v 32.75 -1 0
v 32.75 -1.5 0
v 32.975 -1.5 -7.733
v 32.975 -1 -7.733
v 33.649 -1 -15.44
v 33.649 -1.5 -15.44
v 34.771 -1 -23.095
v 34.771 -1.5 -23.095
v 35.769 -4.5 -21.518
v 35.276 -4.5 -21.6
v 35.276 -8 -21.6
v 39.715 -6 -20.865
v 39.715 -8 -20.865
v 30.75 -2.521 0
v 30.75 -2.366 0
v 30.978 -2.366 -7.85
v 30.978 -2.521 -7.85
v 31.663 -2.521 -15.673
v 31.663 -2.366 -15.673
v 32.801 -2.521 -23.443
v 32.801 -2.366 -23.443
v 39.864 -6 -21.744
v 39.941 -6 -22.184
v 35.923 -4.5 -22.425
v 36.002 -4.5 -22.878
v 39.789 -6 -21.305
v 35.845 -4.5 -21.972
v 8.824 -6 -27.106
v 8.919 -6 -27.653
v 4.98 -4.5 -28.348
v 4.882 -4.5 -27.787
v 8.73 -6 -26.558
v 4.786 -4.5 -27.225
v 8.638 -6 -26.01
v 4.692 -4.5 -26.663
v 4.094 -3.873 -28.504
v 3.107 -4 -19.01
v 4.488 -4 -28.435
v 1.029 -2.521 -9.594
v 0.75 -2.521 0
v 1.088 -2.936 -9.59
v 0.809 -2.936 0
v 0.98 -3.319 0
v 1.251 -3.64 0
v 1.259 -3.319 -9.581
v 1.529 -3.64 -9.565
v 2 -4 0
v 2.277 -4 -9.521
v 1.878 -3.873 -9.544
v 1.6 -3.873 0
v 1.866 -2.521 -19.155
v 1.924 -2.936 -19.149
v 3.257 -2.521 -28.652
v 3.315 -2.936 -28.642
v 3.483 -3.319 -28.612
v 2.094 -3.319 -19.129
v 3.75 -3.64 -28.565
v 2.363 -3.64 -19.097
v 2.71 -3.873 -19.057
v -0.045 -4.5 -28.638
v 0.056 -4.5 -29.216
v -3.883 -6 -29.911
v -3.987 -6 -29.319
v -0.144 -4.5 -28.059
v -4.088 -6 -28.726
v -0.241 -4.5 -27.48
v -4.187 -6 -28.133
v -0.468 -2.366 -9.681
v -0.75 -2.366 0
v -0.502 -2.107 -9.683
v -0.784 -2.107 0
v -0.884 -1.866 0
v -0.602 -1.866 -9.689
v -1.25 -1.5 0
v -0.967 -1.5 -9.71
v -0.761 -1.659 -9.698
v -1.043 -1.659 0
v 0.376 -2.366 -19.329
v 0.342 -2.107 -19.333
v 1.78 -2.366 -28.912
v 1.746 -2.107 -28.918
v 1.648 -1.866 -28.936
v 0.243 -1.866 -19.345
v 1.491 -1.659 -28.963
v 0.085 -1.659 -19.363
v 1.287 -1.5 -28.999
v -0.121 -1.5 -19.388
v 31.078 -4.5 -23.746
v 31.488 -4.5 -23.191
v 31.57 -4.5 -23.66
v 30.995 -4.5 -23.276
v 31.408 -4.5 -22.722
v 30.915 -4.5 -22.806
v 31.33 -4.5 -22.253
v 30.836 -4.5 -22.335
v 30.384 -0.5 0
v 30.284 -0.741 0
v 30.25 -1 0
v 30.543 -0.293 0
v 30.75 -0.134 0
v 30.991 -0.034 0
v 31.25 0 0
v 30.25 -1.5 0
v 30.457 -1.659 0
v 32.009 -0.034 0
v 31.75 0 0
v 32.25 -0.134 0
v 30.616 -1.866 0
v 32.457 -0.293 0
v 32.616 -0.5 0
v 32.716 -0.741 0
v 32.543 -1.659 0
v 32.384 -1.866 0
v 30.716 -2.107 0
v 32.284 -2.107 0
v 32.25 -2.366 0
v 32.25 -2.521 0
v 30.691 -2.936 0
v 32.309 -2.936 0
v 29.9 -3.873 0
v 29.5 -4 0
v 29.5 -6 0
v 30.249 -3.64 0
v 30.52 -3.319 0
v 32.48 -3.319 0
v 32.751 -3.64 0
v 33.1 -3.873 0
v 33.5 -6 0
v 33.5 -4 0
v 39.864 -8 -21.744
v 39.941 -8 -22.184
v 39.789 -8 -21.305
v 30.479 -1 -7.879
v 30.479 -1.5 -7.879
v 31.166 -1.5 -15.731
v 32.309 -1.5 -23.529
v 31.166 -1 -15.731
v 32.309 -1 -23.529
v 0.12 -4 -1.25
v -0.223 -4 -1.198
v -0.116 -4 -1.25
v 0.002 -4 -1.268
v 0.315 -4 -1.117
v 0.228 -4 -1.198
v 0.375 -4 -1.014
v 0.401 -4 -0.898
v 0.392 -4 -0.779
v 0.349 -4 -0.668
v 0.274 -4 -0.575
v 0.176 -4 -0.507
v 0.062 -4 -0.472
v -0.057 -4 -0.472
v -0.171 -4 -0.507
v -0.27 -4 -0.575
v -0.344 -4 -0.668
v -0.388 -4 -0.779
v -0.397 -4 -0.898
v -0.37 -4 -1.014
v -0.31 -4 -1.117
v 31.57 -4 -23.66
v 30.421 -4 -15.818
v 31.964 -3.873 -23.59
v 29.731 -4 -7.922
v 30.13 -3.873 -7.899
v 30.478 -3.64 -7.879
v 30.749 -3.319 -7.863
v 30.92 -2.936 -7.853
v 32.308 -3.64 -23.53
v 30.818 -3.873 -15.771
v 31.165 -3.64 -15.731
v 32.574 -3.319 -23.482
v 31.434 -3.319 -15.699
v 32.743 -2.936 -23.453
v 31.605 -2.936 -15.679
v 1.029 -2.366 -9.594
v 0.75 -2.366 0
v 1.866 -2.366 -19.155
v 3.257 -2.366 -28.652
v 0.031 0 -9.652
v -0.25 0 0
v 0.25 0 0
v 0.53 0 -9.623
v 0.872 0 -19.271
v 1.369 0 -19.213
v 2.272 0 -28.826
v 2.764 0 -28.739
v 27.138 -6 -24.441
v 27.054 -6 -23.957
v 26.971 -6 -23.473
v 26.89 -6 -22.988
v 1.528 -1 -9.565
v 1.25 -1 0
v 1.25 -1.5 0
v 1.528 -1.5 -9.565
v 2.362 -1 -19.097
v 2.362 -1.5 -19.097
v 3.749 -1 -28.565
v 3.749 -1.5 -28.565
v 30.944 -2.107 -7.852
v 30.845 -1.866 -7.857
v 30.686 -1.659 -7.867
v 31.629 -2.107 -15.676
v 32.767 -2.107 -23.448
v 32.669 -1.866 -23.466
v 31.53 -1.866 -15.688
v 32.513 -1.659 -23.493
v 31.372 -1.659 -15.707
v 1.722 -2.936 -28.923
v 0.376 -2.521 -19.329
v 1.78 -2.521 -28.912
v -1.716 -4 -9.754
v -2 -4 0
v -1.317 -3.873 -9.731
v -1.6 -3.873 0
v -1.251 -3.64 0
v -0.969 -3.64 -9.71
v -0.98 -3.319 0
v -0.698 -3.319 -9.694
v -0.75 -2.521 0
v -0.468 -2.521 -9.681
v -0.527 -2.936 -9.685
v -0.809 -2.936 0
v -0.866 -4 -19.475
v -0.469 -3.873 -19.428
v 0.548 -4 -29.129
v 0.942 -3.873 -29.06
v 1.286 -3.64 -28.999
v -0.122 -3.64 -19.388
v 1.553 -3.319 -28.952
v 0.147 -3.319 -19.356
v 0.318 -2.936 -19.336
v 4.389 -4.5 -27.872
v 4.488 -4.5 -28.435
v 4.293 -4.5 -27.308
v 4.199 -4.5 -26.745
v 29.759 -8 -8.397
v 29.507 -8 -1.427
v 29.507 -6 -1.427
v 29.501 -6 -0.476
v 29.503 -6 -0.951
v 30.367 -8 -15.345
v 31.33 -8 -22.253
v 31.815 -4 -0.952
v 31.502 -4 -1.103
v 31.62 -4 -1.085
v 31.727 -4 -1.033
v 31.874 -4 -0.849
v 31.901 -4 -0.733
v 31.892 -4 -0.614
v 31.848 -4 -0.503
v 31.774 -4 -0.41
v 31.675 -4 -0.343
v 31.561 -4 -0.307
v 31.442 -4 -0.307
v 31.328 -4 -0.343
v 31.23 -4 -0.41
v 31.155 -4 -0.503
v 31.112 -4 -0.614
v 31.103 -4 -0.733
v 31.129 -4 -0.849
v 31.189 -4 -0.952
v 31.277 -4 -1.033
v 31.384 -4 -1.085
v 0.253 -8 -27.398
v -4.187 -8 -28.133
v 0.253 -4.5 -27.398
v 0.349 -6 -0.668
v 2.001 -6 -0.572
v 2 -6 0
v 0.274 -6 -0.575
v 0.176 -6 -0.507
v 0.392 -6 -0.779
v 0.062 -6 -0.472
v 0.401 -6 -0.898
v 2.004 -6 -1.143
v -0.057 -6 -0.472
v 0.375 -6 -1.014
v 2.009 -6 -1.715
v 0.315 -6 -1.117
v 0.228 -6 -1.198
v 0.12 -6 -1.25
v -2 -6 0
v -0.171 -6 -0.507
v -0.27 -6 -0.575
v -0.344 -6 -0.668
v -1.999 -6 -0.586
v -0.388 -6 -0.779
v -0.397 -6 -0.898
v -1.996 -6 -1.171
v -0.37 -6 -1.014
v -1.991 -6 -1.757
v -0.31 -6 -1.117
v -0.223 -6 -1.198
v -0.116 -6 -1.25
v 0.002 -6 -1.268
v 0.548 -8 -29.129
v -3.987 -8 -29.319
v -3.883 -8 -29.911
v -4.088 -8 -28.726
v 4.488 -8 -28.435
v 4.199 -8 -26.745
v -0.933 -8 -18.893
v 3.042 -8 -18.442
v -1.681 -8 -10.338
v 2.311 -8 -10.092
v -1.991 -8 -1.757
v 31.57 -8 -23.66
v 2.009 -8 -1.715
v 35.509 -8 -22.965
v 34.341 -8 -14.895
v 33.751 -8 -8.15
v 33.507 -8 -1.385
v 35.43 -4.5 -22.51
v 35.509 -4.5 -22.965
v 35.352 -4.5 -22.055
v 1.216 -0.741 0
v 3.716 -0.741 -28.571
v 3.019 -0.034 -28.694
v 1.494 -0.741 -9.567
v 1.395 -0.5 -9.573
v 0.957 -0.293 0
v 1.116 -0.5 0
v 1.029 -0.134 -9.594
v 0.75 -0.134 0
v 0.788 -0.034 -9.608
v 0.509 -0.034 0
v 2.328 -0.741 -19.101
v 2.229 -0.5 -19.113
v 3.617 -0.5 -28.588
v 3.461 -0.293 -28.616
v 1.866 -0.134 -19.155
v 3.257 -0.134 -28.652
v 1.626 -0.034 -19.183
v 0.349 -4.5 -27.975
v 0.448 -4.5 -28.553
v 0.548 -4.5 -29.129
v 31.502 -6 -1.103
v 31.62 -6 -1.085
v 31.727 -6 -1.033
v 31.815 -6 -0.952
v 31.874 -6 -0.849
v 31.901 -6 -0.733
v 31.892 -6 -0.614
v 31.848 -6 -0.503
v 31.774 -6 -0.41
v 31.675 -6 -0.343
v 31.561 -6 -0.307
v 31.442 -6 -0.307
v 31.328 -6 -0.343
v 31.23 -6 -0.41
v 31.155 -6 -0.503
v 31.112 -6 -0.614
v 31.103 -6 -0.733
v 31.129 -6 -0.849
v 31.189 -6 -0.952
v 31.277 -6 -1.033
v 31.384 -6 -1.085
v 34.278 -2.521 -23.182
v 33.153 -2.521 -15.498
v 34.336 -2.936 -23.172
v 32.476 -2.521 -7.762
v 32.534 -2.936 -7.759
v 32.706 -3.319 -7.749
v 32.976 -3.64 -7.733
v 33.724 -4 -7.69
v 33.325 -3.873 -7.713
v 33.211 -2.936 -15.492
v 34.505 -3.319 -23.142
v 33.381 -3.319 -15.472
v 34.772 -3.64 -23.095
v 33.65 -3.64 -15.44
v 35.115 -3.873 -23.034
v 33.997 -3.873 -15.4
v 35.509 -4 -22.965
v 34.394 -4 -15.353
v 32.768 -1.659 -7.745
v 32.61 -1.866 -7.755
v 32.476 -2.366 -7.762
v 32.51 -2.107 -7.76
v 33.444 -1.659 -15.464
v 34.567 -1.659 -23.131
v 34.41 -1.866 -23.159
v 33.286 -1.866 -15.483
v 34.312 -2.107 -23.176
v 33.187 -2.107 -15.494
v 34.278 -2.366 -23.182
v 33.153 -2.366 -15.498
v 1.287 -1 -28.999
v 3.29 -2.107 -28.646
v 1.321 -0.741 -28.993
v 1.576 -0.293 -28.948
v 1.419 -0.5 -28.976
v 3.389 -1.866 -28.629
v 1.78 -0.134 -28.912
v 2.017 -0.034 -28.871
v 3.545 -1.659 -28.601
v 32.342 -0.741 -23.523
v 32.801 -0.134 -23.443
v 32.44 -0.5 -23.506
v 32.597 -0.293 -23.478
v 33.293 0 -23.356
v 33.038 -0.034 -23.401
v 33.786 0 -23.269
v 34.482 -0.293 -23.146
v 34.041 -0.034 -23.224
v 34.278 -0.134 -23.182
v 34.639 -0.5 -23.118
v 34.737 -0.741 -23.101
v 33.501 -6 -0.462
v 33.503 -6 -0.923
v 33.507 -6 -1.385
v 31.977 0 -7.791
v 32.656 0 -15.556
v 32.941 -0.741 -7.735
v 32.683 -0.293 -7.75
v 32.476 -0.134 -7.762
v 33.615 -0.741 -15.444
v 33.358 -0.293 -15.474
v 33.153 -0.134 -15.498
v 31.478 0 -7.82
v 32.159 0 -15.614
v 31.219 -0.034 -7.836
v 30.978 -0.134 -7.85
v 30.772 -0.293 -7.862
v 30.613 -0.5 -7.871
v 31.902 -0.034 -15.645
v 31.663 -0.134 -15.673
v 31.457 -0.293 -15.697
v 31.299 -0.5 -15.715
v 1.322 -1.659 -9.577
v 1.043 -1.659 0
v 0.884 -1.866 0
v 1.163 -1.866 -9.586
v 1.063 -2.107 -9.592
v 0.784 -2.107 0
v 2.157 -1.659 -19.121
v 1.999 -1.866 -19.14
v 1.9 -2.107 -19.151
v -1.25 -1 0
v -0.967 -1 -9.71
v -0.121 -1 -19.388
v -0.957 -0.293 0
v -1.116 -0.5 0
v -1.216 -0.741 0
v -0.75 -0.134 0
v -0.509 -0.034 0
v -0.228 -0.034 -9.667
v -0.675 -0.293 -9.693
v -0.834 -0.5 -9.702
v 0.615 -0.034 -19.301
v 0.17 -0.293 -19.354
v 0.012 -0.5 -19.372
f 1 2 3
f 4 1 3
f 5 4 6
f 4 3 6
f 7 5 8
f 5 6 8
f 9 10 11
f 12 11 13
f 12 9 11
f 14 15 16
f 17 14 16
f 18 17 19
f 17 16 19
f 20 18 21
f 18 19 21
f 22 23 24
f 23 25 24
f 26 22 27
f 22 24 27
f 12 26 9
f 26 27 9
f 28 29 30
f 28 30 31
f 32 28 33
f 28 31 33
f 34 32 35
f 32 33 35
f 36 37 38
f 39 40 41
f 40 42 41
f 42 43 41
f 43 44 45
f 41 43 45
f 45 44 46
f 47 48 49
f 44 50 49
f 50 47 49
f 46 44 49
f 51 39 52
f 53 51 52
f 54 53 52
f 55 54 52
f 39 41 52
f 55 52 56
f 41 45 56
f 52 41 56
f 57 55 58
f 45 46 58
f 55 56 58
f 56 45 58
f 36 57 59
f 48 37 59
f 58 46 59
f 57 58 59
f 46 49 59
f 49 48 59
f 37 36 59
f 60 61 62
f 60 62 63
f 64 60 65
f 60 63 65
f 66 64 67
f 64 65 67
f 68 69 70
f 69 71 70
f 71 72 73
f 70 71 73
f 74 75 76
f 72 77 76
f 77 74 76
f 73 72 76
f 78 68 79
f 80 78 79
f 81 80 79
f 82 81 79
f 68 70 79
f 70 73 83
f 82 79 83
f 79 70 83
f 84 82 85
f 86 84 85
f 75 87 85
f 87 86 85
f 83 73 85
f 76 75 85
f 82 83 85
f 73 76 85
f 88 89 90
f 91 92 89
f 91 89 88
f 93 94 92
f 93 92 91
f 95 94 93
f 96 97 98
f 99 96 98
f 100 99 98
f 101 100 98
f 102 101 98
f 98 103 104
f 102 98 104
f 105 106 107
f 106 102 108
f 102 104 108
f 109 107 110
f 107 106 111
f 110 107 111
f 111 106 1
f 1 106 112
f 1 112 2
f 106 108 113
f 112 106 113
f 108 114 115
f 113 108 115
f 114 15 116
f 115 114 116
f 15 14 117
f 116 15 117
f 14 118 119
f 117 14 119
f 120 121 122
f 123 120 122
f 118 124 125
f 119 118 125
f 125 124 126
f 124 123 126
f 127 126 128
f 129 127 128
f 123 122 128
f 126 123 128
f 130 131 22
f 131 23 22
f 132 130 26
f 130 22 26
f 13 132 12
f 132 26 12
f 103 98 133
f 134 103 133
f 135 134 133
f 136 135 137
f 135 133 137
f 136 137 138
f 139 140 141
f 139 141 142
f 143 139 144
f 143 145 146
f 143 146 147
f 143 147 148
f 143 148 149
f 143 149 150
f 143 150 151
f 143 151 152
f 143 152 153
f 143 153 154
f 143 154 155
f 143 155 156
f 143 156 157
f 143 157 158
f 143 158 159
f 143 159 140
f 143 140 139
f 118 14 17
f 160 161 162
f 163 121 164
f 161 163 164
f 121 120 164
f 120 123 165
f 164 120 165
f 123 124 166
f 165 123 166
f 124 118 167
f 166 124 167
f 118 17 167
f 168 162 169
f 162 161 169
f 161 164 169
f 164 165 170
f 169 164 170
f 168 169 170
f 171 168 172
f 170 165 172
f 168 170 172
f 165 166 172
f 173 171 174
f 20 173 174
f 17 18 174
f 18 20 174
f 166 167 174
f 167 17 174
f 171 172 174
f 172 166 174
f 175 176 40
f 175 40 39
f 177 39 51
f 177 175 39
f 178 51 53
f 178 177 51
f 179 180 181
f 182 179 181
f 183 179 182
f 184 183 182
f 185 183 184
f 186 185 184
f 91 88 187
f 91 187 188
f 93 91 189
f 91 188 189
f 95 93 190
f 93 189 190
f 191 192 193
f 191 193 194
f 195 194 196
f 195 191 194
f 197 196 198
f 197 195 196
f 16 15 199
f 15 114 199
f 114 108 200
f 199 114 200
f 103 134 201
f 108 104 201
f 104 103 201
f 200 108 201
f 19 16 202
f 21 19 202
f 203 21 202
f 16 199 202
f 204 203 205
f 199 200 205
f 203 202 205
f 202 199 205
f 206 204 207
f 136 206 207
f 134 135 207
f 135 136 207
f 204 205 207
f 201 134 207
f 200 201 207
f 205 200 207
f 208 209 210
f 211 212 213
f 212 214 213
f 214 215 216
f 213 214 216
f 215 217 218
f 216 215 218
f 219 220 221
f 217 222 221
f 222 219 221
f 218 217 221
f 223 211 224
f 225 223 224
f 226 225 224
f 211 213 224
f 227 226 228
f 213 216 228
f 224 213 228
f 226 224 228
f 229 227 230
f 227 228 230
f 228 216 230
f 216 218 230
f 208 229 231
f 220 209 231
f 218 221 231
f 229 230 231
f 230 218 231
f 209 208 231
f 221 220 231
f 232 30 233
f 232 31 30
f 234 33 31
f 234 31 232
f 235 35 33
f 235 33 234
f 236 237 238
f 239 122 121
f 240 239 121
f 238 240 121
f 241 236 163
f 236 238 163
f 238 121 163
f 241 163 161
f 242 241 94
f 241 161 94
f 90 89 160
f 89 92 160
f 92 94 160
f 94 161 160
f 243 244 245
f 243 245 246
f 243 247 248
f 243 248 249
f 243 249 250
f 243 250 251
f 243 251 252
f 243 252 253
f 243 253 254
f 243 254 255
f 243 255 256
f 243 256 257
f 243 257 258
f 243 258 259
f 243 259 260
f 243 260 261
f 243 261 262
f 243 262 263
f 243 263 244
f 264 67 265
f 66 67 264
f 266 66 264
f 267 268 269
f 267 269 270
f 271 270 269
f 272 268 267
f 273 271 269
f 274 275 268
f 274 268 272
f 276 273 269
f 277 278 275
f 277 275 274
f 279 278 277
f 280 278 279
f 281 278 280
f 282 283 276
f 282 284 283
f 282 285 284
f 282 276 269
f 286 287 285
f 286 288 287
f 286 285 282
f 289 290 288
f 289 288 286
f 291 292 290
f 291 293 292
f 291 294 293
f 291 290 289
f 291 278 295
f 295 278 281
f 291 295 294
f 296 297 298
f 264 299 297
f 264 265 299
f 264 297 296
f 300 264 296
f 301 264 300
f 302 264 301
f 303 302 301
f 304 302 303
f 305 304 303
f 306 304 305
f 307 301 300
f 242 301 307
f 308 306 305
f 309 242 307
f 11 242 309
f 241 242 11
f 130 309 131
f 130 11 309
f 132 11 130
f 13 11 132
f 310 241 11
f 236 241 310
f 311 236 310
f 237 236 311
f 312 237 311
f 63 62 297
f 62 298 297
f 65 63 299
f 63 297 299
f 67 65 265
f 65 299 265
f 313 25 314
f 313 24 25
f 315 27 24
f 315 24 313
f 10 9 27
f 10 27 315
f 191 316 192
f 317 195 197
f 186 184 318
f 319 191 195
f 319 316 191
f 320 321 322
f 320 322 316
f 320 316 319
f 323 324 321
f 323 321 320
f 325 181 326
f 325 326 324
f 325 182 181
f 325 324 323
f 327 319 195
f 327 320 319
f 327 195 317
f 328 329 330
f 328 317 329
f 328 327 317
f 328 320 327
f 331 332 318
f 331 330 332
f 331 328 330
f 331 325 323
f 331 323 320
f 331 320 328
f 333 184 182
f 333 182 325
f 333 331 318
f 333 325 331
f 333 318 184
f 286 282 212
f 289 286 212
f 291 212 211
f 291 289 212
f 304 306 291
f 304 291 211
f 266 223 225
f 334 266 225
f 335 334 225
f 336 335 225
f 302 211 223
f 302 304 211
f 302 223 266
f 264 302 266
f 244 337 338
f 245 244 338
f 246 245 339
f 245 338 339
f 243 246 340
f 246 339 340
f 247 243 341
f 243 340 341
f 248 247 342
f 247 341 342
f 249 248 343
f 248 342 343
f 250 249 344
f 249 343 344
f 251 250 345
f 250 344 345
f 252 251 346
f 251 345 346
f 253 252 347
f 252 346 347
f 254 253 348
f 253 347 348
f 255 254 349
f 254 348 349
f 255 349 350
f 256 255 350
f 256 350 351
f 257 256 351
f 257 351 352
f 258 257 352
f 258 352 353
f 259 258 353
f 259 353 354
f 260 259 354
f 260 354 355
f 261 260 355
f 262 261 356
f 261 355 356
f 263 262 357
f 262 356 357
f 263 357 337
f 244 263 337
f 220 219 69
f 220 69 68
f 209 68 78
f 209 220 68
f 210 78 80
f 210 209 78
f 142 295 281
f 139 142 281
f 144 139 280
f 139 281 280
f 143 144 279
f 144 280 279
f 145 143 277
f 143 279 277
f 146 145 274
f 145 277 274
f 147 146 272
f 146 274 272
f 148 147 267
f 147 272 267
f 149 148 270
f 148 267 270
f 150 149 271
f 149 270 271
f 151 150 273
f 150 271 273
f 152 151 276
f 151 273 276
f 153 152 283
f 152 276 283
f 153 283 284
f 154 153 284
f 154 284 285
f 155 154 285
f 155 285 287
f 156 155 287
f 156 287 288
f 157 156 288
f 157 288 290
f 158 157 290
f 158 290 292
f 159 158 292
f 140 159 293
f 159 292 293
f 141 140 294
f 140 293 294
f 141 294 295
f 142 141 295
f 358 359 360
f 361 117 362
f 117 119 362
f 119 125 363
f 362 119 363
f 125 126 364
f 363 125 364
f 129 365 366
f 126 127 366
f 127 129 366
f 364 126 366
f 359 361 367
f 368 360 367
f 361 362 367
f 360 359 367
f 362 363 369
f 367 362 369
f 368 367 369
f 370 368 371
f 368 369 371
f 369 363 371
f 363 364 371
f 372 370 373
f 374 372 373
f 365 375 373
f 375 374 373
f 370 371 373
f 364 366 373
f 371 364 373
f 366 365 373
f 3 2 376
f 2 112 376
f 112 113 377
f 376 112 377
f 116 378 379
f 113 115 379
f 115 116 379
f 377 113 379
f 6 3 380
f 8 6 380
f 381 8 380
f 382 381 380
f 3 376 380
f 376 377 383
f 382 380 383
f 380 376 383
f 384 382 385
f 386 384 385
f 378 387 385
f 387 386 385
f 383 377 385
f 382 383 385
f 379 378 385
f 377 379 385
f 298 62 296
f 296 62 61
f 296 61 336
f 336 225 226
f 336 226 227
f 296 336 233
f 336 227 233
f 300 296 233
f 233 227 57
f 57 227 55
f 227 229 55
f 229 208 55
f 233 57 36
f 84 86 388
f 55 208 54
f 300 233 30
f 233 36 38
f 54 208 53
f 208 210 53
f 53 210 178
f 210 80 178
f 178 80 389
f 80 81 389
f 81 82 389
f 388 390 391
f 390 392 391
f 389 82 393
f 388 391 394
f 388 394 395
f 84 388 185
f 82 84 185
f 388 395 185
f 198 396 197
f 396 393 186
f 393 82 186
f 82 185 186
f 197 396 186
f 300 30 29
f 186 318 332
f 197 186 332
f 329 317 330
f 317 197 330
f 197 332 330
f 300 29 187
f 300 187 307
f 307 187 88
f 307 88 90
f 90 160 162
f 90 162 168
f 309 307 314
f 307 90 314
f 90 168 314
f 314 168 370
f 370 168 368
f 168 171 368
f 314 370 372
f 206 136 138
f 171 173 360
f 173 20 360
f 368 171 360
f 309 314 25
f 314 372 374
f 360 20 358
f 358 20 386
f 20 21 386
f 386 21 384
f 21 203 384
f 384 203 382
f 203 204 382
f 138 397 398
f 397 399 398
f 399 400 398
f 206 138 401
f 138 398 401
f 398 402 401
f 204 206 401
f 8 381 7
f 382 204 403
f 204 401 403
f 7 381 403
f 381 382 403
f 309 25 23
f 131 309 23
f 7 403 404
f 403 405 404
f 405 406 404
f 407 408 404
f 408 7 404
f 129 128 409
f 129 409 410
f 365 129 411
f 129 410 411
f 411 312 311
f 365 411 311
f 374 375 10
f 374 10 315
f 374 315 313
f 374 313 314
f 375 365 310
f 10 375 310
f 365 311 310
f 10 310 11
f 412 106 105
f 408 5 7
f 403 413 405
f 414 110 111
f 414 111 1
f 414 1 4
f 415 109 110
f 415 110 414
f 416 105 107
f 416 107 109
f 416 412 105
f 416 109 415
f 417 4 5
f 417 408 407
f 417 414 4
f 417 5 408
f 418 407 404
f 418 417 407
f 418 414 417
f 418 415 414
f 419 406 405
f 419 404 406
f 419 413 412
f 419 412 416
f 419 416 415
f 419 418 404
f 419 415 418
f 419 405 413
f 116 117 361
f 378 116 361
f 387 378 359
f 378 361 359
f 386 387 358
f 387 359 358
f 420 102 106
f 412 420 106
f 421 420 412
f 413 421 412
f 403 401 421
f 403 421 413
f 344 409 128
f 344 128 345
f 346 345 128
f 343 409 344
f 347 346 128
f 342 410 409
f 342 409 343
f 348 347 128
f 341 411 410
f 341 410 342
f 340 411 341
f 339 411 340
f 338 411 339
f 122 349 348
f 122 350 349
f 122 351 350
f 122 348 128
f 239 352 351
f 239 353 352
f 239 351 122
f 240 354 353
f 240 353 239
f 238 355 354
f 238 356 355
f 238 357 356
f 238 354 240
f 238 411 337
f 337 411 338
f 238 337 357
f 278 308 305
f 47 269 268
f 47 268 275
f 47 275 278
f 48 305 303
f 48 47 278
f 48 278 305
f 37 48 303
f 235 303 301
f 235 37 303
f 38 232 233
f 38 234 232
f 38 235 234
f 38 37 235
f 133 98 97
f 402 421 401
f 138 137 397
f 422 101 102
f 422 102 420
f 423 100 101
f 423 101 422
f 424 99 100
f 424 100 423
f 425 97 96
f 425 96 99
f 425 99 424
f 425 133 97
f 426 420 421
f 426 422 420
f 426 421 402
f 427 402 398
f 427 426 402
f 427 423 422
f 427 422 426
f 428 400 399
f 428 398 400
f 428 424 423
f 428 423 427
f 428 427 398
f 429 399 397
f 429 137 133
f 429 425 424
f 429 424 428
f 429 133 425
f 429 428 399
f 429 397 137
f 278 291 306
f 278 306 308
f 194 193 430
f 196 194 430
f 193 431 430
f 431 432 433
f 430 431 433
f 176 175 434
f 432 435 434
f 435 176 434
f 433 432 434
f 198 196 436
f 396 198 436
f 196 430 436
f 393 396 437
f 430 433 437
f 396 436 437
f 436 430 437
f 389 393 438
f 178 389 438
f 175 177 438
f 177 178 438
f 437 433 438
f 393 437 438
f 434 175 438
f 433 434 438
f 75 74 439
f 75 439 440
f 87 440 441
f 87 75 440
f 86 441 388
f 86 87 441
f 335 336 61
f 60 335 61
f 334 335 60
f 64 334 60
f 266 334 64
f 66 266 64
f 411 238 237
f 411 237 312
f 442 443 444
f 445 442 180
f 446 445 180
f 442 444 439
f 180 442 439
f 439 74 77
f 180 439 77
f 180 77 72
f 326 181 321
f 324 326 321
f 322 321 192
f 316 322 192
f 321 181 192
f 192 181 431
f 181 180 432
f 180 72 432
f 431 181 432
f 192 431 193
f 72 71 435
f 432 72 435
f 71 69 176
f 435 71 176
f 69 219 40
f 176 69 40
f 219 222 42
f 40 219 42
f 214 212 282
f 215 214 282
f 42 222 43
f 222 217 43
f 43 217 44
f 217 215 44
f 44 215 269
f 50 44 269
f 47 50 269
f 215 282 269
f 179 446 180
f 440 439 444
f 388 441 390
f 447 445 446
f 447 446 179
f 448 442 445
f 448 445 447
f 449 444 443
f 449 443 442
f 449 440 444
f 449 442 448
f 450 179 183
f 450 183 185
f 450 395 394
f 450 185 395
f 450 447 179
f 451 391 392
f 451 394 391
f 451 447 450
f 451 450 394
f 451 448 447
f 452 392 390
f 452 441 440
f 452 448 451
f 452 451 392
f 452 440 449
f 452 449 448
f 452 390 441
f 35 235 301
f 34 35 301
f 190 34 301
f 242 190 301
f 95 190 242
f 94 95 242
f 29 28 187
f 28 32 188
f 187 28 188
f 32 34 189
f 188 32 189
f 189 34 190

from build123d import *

# Parameters (mm, degrees)
REVOLVE_1_ANGLE     = 10
FILLET_1_R          = 1.5
FILLET_2_R          = 1.5
FILLET_3_R          = 1
FILLET_4_R          = 1
SKETCH_7_W          = 4
SKETCH_7_H          = 2
CUT_REVOLVE_1_ANGLE = 0.6
SKETCH_10_R         = 0.4
CUT_EXTRUDE_1_DEPTH = 2
REVOLVE_2_ANGLE     = 0.6


with BuildPart() as part:
    # 草图4 → 旋转1 (revolve)
    with BuildSketch(Plane.XY):
        Polygon((0.75, -1.5), (1.25, -1.5), (1.25, 0), (0, 0), (-1.25, 0), (-1.25, -1.5), (-0.75, -1.5), (-0.75, -4), (-2, -4), (-2, -8), (0, -8), (2, -8), (2, -4), (0.75, -4), align=None)
        Polygon((31.5, 0), (32.75, 0), (32.75, -1.5), (32.25, -1.5), (32.25, -4), (33.5, -4), (33.5, -8), (31.5, -8), (29.5, -8), (29.5, -4), (30.75, -4), (30.75, -1.5), (30.25, -1.5), (30.25, 0), align=None)
    revolve(axis=Axis((165.75, 3.853460973, 0), (0, -1, 0)), revolution_arc=REVOLVE_1_ANGLE)

    # 圆角1
    # the kernel refuses this fillet: 1.5 mm, written as the material it adds along each edge
    with BuildSketch(Plane(origin=(165.75, -4, 0), x_dir=(-1, 0, 0), z_dir=(0, 0, 1))) as fillet_1_piece_1:
        with BuildLine():
            CenterArc((163.5, -1.479019946), FILLET_1_R, 0, 80.405931773)
            Line((165, -1.479019946), (165.03, -1.479019946))
            Line((165.03, -1.479019946), (165.03, 0))
            Line((165.03, 0), (165, 0.03))
            ThreePointArc((165, 0.03), (164.375, 0.03), (163.755, 0.029580399))
            Line((163.755, 0.029580399), (163.75, 0))
        make_face()
    revolve(axis=Axis((165.75, -4, 0), (0, -1, 0)), revolution_arc=10)
    with BuildSketch(Plane(origin=(165.75, -4, 0), x_dir=(-1, 0, 0), z_dir=(0, 0, 1))) as fillet_1_piece_2:
        with BuildLine():
            CenterArc((168, -1.479019946), FILLET_1_R, 99.594068227, 80.405931773)
            Line((166.5, -1.479019946), (166.47, -1.479019946))
            Line((166.47, -1.479019946), (166.47, 0))
            Line((166.47, 0), (166.5, 0.03))
            ThreePointArc((166.5, 0.03), (167.125, 0.03), (167.745, 0.029580399))
            Line((167.745, 0.029580399), (167.75, 0))
        make_face()
    revolve(axis=Axis((165.75, -4, 0), (0, -1, 0)), revolution_arc=10)

    # 圆角2
    # the kernel refuses this fillet: 1.5 mm, written as the material it adds along each edge
    with BuildSketch(Plane(origin=(165.75, -4, 0), x_dir=(-1, 0, 0), z_dir=(0, 0, 1))) as fillet_2_piece_1:
        with BuildLine():
            CenterArc((136.5, -1.479019946), FILLET_2_R, 99.594068227, 80.405931773)
            Line((136.25, 0), (136.245, 0.029580399))
            ThreePointArc((136.245, 0.029580399), (135.625, 0.03), (135, 0.03))
            Line((135, 0.03), (134.97, 0))
            Line((134.97, 0), (134.97, -1.479019946))
            Line((134.97, -1.479019946), (135, -1.479019946))
        make_face()
    revolve(axis=Axis((165.75, -4, 0), (0, -1, 0)), revolution_arc=10)
    with BuildSketch(Plane(origin=(165.75, -4, 0), x_dir=(-1, 0, 0), z_dir=(0, 0, 1))) as fillet_2_piece_2:
        with BuildLine():
            CenterArc((132, -1.479019946), FILLET_2_R, 0, 80.405931773)
            Line((133.5, -1.479019946), (133.53, -1.479019946))
            Line((133.53, -1.479019946), (133.53, 0))
            Line((133.53, 0), (133.5, 0.03))
            ThreePointArc((133.5, 0.03), (132.875, 0.03), (132.255, 0.029580399))
            Line((132.255, 0.029580399), (132.25, 0))
        make_face()
    revolve(axis=Axis((165.75, -4, 0), (0, -1, 0)), revolution_arc=10)

    # 圆角3
    # the kernel refuses this fillet: 1 mm, written as the material it adds along each edge
    with BuildSketch(Plane(origin=(165.75, -1.5, 0), x_dir=(-1, 0, 0), z_dir=(0, 0, 1))) as fillet_3_piece_1:
        with BuildLine():
            CenterArc((136, 0.866025404), FILLET_3_R, 180, 60)
            Line((135, 0.866025404), (135, 0))
            Line((135, 0), (135.5, 0))
        make_face()
    revolve(axis=Axis((165.75, -1.5, 0), (0, -1, 0)), revolution_arc=10)
    with BuildSketch(Plane(origin=(165.75, -1.5, 0), x_dir=(-1, 0, 0), z_dir=(0, 0, 1))) as fillet_3_piece_2:
        with BuildLine():
            CenterArc((132.5, 0.866025404), FILLET_3_R, 300, 60)
            Line((133, 0), (133.5, 0))
            Line((133.5, 0), (133.5, 0.866025404))
        make_face()
    revolve(axis=Axis((165.75, -1.5, 0), (0, -1, 0)), revolution_arc=10)
    # the kernel refuses this fillet: 1 mm, written as the material it takes off along each edge
    with BuildSketch(Plane(origin=(165.75, 0, 0), x_dir=(-0.9998233399867428, 0, 0.018795978765534377), z_dir=(0.018795978765534377, 0, 0.9998233399867428))) as fillet_3_2_piece_1:
        with BuildLine():
            CenterArc((133 + FILLET_3_R, FILLET_3_R), FILLET_3_R, 180, 90)
            Line((133, FILLET_3_R), (133, 0))
            Line((133, 0), (133 + FILLET_3_R, 0))
        make_face()
    revolve(axis=Axis((165.75, 0, 0), (0, -1, 0)), revolution_arc=12.153987353, mode=Mode.SUBTRACT)
    with BuildSketch(Plane(origin=(165.75, 0, 0), x_dir=(-0.9998297984864879, 0, 0.01844922921070363), z_dir=(0.01844922921070363, 0, 0.9998297984864879))) as fillet_3_2_piece_2:
        with BuildLine():
            CenterArc((135.5 - FILLET_3_R, FILLET_3_R), FILLET_3_R, 270, 90)
            Line((135.5 - FILLET_3_R, 0), (135.5, 0))
            Line((135.5, 0), (135.5, FILLET_3_R))
        make_face()
    revolve(axis=Axis((165.75, 0, 0), (0, -1, 0)), revolution_arc=12.114245889, mode=Mode.SUBTRACT)

    # 圆角4
    # the kernel refuses this fillet: 1 mm, written as the material it adds along each edge
    with BuildSketch(Plane(origin=(165.75, -1.5, 0), x_dir=(-1, 0, 0), z_dir=(0, 0, 1))) as fillet_4_piece_1:
        with BuildLine():
            CenterArc((167.5, 0.866025404), FILLET_4_R, 180, 60)
            Line((167, 0), (166.5, 0))
            Line((166.5, 0), (166.5, 0.866025404))
        make_face()
    revolve(axis=Axis((165.75, -1.5, 0), (0, -1, 0)), revolution_arc=10)
    with BuildSketch(Plane(origin=(165.75, -1.5, 0), x_dir=(-1, 0, 0), z_dir=(0, 0, 1))) as fillet_4_piece_2:
        with BuildLine():
            CenterArc((164, 0.866025404), FILLET_4_R, 300, 60)
            Line((164.5, 0), (165, 0))
            Line((165, 0), (165, 0.866025404))
        make_face()
    revolve(axis=Axis((165.75, -1.5, 0), (0, -1, 0)), revolution_arc=10)
    # the kernel refuses this fillet: 1 mm, written as the material it takes off along each edge
    with BuildSketch(Plane(origin=(165.75, 0, 0), x_dir=(-0.9998845180351503, 0, 0.015197058715919934), z_dir=(0.015197058715919934, 0, 0.9998845180351503))) as fillet_4_2_piece_1:
        with BuildLine():
            CenterArc((164.5 + FILLET_4_R, FILLET_4_R), FILLET_4_R, 180, 90)
            Line((164.5, FILLET_4_R), (164.5, 0))
            Line((164.5, 0), (164.5 + FILLET_4_R, 0))
        make_face()
    revolve(axis=Axis((165.75, 0, 0), (0, -1, 0)), revolution_arc=11.74152169, mode=Mode.SUBTRACT)
    with BuildSketch(Plane(origin=(165.75, 0, 0), x_dir=(-0.9998879496351009, 0, 0.014969574961036002), z_dir=(0.014969574961036002, 0, 0.9998879496351009))) as fillet_4_2_piece_2:
        with BuildLine():
            CenterArc((167 - FILLET_4_R, FILLET_4_R), FILLET_4_R, 270, 90)
            Line((167 - FILLET_4_R, 0), (167, 0))
            Line((167, 0), (167, FILLET_4_R))
        make_face()
    revolve(axis=Axis((165.75, 0, 0), (0, -1, 0)), revolution_arc=11.715451006, mode=Mode.SUBTRACT)

    # 草图7 → 切除-旋转1 (revolve, cut)
    with BuildSketch(Plane.XY):
        with Locations((0, -7)):
            Rectangle(SKETCH_7_W, SKETCH_7_H)
        with Locations((31.5, -7)):
            Rectangle(SKETCH_7_W, SKETCH_7_H)
    revolve(axis=Axis((165.75, 3.853460973, 0), (0, -1, 0)), revolution_arc=CUT_REVOLVE_1_ANGLE, mode=Mode.SUBTRACT)

    # 草图10 → 切除-拉伸1 (cut)
    with BuildSketch(Plane.XZ.offset(6)):
        with Locations(Location((0.00227206, -0.867861005, 0), (0, 0, 270))):
            Circle(SKETCH_10_R)
        with Locations(Location((31.501840266, -0.702928144, 0), (0, 0, 270))):
            Circle(SKETCH_10_R)
    extrude(amount=-CUT_EXTRUDE_1_DEPTH, mode=Mode.SUBTRACT)

    # 草图11 → 旋转2 (revolve)
    with BuildSketch(Plane(origin=(4.997974052, 0, -28.344919378), x_dir=(-0.9848077530122081, 0, -0.17364817766693072), z_dir=(0.17364817766693072, 0, -0.9848077530122081))):
        Polygon((-26.981885062, -4.5), (-26.481885062, -4.5), (-22.481885062, -6), (-3.981885062, -6), (0.018114938, -4.5), (0.518114938, -4.5), (4.518114938, -4.5), (5.018114938, -4.5), (9.018114938, -6), (9.018114938, -8), (4.518114938, -8), (0.518114938, -8), (-26.981885062, -8), (-30.981885062, -8), (-35.481885062, -8), (-35.481885062, -6), (-31.481885062, -4.5), (-30.981885062, -4.5), align=None)
    revolve(axis=Axis((165.75, 3.853460973, 0), (0, 1, 0)), revolution_arc=REVOLVE_2_ANGLE)


solid = part.part
